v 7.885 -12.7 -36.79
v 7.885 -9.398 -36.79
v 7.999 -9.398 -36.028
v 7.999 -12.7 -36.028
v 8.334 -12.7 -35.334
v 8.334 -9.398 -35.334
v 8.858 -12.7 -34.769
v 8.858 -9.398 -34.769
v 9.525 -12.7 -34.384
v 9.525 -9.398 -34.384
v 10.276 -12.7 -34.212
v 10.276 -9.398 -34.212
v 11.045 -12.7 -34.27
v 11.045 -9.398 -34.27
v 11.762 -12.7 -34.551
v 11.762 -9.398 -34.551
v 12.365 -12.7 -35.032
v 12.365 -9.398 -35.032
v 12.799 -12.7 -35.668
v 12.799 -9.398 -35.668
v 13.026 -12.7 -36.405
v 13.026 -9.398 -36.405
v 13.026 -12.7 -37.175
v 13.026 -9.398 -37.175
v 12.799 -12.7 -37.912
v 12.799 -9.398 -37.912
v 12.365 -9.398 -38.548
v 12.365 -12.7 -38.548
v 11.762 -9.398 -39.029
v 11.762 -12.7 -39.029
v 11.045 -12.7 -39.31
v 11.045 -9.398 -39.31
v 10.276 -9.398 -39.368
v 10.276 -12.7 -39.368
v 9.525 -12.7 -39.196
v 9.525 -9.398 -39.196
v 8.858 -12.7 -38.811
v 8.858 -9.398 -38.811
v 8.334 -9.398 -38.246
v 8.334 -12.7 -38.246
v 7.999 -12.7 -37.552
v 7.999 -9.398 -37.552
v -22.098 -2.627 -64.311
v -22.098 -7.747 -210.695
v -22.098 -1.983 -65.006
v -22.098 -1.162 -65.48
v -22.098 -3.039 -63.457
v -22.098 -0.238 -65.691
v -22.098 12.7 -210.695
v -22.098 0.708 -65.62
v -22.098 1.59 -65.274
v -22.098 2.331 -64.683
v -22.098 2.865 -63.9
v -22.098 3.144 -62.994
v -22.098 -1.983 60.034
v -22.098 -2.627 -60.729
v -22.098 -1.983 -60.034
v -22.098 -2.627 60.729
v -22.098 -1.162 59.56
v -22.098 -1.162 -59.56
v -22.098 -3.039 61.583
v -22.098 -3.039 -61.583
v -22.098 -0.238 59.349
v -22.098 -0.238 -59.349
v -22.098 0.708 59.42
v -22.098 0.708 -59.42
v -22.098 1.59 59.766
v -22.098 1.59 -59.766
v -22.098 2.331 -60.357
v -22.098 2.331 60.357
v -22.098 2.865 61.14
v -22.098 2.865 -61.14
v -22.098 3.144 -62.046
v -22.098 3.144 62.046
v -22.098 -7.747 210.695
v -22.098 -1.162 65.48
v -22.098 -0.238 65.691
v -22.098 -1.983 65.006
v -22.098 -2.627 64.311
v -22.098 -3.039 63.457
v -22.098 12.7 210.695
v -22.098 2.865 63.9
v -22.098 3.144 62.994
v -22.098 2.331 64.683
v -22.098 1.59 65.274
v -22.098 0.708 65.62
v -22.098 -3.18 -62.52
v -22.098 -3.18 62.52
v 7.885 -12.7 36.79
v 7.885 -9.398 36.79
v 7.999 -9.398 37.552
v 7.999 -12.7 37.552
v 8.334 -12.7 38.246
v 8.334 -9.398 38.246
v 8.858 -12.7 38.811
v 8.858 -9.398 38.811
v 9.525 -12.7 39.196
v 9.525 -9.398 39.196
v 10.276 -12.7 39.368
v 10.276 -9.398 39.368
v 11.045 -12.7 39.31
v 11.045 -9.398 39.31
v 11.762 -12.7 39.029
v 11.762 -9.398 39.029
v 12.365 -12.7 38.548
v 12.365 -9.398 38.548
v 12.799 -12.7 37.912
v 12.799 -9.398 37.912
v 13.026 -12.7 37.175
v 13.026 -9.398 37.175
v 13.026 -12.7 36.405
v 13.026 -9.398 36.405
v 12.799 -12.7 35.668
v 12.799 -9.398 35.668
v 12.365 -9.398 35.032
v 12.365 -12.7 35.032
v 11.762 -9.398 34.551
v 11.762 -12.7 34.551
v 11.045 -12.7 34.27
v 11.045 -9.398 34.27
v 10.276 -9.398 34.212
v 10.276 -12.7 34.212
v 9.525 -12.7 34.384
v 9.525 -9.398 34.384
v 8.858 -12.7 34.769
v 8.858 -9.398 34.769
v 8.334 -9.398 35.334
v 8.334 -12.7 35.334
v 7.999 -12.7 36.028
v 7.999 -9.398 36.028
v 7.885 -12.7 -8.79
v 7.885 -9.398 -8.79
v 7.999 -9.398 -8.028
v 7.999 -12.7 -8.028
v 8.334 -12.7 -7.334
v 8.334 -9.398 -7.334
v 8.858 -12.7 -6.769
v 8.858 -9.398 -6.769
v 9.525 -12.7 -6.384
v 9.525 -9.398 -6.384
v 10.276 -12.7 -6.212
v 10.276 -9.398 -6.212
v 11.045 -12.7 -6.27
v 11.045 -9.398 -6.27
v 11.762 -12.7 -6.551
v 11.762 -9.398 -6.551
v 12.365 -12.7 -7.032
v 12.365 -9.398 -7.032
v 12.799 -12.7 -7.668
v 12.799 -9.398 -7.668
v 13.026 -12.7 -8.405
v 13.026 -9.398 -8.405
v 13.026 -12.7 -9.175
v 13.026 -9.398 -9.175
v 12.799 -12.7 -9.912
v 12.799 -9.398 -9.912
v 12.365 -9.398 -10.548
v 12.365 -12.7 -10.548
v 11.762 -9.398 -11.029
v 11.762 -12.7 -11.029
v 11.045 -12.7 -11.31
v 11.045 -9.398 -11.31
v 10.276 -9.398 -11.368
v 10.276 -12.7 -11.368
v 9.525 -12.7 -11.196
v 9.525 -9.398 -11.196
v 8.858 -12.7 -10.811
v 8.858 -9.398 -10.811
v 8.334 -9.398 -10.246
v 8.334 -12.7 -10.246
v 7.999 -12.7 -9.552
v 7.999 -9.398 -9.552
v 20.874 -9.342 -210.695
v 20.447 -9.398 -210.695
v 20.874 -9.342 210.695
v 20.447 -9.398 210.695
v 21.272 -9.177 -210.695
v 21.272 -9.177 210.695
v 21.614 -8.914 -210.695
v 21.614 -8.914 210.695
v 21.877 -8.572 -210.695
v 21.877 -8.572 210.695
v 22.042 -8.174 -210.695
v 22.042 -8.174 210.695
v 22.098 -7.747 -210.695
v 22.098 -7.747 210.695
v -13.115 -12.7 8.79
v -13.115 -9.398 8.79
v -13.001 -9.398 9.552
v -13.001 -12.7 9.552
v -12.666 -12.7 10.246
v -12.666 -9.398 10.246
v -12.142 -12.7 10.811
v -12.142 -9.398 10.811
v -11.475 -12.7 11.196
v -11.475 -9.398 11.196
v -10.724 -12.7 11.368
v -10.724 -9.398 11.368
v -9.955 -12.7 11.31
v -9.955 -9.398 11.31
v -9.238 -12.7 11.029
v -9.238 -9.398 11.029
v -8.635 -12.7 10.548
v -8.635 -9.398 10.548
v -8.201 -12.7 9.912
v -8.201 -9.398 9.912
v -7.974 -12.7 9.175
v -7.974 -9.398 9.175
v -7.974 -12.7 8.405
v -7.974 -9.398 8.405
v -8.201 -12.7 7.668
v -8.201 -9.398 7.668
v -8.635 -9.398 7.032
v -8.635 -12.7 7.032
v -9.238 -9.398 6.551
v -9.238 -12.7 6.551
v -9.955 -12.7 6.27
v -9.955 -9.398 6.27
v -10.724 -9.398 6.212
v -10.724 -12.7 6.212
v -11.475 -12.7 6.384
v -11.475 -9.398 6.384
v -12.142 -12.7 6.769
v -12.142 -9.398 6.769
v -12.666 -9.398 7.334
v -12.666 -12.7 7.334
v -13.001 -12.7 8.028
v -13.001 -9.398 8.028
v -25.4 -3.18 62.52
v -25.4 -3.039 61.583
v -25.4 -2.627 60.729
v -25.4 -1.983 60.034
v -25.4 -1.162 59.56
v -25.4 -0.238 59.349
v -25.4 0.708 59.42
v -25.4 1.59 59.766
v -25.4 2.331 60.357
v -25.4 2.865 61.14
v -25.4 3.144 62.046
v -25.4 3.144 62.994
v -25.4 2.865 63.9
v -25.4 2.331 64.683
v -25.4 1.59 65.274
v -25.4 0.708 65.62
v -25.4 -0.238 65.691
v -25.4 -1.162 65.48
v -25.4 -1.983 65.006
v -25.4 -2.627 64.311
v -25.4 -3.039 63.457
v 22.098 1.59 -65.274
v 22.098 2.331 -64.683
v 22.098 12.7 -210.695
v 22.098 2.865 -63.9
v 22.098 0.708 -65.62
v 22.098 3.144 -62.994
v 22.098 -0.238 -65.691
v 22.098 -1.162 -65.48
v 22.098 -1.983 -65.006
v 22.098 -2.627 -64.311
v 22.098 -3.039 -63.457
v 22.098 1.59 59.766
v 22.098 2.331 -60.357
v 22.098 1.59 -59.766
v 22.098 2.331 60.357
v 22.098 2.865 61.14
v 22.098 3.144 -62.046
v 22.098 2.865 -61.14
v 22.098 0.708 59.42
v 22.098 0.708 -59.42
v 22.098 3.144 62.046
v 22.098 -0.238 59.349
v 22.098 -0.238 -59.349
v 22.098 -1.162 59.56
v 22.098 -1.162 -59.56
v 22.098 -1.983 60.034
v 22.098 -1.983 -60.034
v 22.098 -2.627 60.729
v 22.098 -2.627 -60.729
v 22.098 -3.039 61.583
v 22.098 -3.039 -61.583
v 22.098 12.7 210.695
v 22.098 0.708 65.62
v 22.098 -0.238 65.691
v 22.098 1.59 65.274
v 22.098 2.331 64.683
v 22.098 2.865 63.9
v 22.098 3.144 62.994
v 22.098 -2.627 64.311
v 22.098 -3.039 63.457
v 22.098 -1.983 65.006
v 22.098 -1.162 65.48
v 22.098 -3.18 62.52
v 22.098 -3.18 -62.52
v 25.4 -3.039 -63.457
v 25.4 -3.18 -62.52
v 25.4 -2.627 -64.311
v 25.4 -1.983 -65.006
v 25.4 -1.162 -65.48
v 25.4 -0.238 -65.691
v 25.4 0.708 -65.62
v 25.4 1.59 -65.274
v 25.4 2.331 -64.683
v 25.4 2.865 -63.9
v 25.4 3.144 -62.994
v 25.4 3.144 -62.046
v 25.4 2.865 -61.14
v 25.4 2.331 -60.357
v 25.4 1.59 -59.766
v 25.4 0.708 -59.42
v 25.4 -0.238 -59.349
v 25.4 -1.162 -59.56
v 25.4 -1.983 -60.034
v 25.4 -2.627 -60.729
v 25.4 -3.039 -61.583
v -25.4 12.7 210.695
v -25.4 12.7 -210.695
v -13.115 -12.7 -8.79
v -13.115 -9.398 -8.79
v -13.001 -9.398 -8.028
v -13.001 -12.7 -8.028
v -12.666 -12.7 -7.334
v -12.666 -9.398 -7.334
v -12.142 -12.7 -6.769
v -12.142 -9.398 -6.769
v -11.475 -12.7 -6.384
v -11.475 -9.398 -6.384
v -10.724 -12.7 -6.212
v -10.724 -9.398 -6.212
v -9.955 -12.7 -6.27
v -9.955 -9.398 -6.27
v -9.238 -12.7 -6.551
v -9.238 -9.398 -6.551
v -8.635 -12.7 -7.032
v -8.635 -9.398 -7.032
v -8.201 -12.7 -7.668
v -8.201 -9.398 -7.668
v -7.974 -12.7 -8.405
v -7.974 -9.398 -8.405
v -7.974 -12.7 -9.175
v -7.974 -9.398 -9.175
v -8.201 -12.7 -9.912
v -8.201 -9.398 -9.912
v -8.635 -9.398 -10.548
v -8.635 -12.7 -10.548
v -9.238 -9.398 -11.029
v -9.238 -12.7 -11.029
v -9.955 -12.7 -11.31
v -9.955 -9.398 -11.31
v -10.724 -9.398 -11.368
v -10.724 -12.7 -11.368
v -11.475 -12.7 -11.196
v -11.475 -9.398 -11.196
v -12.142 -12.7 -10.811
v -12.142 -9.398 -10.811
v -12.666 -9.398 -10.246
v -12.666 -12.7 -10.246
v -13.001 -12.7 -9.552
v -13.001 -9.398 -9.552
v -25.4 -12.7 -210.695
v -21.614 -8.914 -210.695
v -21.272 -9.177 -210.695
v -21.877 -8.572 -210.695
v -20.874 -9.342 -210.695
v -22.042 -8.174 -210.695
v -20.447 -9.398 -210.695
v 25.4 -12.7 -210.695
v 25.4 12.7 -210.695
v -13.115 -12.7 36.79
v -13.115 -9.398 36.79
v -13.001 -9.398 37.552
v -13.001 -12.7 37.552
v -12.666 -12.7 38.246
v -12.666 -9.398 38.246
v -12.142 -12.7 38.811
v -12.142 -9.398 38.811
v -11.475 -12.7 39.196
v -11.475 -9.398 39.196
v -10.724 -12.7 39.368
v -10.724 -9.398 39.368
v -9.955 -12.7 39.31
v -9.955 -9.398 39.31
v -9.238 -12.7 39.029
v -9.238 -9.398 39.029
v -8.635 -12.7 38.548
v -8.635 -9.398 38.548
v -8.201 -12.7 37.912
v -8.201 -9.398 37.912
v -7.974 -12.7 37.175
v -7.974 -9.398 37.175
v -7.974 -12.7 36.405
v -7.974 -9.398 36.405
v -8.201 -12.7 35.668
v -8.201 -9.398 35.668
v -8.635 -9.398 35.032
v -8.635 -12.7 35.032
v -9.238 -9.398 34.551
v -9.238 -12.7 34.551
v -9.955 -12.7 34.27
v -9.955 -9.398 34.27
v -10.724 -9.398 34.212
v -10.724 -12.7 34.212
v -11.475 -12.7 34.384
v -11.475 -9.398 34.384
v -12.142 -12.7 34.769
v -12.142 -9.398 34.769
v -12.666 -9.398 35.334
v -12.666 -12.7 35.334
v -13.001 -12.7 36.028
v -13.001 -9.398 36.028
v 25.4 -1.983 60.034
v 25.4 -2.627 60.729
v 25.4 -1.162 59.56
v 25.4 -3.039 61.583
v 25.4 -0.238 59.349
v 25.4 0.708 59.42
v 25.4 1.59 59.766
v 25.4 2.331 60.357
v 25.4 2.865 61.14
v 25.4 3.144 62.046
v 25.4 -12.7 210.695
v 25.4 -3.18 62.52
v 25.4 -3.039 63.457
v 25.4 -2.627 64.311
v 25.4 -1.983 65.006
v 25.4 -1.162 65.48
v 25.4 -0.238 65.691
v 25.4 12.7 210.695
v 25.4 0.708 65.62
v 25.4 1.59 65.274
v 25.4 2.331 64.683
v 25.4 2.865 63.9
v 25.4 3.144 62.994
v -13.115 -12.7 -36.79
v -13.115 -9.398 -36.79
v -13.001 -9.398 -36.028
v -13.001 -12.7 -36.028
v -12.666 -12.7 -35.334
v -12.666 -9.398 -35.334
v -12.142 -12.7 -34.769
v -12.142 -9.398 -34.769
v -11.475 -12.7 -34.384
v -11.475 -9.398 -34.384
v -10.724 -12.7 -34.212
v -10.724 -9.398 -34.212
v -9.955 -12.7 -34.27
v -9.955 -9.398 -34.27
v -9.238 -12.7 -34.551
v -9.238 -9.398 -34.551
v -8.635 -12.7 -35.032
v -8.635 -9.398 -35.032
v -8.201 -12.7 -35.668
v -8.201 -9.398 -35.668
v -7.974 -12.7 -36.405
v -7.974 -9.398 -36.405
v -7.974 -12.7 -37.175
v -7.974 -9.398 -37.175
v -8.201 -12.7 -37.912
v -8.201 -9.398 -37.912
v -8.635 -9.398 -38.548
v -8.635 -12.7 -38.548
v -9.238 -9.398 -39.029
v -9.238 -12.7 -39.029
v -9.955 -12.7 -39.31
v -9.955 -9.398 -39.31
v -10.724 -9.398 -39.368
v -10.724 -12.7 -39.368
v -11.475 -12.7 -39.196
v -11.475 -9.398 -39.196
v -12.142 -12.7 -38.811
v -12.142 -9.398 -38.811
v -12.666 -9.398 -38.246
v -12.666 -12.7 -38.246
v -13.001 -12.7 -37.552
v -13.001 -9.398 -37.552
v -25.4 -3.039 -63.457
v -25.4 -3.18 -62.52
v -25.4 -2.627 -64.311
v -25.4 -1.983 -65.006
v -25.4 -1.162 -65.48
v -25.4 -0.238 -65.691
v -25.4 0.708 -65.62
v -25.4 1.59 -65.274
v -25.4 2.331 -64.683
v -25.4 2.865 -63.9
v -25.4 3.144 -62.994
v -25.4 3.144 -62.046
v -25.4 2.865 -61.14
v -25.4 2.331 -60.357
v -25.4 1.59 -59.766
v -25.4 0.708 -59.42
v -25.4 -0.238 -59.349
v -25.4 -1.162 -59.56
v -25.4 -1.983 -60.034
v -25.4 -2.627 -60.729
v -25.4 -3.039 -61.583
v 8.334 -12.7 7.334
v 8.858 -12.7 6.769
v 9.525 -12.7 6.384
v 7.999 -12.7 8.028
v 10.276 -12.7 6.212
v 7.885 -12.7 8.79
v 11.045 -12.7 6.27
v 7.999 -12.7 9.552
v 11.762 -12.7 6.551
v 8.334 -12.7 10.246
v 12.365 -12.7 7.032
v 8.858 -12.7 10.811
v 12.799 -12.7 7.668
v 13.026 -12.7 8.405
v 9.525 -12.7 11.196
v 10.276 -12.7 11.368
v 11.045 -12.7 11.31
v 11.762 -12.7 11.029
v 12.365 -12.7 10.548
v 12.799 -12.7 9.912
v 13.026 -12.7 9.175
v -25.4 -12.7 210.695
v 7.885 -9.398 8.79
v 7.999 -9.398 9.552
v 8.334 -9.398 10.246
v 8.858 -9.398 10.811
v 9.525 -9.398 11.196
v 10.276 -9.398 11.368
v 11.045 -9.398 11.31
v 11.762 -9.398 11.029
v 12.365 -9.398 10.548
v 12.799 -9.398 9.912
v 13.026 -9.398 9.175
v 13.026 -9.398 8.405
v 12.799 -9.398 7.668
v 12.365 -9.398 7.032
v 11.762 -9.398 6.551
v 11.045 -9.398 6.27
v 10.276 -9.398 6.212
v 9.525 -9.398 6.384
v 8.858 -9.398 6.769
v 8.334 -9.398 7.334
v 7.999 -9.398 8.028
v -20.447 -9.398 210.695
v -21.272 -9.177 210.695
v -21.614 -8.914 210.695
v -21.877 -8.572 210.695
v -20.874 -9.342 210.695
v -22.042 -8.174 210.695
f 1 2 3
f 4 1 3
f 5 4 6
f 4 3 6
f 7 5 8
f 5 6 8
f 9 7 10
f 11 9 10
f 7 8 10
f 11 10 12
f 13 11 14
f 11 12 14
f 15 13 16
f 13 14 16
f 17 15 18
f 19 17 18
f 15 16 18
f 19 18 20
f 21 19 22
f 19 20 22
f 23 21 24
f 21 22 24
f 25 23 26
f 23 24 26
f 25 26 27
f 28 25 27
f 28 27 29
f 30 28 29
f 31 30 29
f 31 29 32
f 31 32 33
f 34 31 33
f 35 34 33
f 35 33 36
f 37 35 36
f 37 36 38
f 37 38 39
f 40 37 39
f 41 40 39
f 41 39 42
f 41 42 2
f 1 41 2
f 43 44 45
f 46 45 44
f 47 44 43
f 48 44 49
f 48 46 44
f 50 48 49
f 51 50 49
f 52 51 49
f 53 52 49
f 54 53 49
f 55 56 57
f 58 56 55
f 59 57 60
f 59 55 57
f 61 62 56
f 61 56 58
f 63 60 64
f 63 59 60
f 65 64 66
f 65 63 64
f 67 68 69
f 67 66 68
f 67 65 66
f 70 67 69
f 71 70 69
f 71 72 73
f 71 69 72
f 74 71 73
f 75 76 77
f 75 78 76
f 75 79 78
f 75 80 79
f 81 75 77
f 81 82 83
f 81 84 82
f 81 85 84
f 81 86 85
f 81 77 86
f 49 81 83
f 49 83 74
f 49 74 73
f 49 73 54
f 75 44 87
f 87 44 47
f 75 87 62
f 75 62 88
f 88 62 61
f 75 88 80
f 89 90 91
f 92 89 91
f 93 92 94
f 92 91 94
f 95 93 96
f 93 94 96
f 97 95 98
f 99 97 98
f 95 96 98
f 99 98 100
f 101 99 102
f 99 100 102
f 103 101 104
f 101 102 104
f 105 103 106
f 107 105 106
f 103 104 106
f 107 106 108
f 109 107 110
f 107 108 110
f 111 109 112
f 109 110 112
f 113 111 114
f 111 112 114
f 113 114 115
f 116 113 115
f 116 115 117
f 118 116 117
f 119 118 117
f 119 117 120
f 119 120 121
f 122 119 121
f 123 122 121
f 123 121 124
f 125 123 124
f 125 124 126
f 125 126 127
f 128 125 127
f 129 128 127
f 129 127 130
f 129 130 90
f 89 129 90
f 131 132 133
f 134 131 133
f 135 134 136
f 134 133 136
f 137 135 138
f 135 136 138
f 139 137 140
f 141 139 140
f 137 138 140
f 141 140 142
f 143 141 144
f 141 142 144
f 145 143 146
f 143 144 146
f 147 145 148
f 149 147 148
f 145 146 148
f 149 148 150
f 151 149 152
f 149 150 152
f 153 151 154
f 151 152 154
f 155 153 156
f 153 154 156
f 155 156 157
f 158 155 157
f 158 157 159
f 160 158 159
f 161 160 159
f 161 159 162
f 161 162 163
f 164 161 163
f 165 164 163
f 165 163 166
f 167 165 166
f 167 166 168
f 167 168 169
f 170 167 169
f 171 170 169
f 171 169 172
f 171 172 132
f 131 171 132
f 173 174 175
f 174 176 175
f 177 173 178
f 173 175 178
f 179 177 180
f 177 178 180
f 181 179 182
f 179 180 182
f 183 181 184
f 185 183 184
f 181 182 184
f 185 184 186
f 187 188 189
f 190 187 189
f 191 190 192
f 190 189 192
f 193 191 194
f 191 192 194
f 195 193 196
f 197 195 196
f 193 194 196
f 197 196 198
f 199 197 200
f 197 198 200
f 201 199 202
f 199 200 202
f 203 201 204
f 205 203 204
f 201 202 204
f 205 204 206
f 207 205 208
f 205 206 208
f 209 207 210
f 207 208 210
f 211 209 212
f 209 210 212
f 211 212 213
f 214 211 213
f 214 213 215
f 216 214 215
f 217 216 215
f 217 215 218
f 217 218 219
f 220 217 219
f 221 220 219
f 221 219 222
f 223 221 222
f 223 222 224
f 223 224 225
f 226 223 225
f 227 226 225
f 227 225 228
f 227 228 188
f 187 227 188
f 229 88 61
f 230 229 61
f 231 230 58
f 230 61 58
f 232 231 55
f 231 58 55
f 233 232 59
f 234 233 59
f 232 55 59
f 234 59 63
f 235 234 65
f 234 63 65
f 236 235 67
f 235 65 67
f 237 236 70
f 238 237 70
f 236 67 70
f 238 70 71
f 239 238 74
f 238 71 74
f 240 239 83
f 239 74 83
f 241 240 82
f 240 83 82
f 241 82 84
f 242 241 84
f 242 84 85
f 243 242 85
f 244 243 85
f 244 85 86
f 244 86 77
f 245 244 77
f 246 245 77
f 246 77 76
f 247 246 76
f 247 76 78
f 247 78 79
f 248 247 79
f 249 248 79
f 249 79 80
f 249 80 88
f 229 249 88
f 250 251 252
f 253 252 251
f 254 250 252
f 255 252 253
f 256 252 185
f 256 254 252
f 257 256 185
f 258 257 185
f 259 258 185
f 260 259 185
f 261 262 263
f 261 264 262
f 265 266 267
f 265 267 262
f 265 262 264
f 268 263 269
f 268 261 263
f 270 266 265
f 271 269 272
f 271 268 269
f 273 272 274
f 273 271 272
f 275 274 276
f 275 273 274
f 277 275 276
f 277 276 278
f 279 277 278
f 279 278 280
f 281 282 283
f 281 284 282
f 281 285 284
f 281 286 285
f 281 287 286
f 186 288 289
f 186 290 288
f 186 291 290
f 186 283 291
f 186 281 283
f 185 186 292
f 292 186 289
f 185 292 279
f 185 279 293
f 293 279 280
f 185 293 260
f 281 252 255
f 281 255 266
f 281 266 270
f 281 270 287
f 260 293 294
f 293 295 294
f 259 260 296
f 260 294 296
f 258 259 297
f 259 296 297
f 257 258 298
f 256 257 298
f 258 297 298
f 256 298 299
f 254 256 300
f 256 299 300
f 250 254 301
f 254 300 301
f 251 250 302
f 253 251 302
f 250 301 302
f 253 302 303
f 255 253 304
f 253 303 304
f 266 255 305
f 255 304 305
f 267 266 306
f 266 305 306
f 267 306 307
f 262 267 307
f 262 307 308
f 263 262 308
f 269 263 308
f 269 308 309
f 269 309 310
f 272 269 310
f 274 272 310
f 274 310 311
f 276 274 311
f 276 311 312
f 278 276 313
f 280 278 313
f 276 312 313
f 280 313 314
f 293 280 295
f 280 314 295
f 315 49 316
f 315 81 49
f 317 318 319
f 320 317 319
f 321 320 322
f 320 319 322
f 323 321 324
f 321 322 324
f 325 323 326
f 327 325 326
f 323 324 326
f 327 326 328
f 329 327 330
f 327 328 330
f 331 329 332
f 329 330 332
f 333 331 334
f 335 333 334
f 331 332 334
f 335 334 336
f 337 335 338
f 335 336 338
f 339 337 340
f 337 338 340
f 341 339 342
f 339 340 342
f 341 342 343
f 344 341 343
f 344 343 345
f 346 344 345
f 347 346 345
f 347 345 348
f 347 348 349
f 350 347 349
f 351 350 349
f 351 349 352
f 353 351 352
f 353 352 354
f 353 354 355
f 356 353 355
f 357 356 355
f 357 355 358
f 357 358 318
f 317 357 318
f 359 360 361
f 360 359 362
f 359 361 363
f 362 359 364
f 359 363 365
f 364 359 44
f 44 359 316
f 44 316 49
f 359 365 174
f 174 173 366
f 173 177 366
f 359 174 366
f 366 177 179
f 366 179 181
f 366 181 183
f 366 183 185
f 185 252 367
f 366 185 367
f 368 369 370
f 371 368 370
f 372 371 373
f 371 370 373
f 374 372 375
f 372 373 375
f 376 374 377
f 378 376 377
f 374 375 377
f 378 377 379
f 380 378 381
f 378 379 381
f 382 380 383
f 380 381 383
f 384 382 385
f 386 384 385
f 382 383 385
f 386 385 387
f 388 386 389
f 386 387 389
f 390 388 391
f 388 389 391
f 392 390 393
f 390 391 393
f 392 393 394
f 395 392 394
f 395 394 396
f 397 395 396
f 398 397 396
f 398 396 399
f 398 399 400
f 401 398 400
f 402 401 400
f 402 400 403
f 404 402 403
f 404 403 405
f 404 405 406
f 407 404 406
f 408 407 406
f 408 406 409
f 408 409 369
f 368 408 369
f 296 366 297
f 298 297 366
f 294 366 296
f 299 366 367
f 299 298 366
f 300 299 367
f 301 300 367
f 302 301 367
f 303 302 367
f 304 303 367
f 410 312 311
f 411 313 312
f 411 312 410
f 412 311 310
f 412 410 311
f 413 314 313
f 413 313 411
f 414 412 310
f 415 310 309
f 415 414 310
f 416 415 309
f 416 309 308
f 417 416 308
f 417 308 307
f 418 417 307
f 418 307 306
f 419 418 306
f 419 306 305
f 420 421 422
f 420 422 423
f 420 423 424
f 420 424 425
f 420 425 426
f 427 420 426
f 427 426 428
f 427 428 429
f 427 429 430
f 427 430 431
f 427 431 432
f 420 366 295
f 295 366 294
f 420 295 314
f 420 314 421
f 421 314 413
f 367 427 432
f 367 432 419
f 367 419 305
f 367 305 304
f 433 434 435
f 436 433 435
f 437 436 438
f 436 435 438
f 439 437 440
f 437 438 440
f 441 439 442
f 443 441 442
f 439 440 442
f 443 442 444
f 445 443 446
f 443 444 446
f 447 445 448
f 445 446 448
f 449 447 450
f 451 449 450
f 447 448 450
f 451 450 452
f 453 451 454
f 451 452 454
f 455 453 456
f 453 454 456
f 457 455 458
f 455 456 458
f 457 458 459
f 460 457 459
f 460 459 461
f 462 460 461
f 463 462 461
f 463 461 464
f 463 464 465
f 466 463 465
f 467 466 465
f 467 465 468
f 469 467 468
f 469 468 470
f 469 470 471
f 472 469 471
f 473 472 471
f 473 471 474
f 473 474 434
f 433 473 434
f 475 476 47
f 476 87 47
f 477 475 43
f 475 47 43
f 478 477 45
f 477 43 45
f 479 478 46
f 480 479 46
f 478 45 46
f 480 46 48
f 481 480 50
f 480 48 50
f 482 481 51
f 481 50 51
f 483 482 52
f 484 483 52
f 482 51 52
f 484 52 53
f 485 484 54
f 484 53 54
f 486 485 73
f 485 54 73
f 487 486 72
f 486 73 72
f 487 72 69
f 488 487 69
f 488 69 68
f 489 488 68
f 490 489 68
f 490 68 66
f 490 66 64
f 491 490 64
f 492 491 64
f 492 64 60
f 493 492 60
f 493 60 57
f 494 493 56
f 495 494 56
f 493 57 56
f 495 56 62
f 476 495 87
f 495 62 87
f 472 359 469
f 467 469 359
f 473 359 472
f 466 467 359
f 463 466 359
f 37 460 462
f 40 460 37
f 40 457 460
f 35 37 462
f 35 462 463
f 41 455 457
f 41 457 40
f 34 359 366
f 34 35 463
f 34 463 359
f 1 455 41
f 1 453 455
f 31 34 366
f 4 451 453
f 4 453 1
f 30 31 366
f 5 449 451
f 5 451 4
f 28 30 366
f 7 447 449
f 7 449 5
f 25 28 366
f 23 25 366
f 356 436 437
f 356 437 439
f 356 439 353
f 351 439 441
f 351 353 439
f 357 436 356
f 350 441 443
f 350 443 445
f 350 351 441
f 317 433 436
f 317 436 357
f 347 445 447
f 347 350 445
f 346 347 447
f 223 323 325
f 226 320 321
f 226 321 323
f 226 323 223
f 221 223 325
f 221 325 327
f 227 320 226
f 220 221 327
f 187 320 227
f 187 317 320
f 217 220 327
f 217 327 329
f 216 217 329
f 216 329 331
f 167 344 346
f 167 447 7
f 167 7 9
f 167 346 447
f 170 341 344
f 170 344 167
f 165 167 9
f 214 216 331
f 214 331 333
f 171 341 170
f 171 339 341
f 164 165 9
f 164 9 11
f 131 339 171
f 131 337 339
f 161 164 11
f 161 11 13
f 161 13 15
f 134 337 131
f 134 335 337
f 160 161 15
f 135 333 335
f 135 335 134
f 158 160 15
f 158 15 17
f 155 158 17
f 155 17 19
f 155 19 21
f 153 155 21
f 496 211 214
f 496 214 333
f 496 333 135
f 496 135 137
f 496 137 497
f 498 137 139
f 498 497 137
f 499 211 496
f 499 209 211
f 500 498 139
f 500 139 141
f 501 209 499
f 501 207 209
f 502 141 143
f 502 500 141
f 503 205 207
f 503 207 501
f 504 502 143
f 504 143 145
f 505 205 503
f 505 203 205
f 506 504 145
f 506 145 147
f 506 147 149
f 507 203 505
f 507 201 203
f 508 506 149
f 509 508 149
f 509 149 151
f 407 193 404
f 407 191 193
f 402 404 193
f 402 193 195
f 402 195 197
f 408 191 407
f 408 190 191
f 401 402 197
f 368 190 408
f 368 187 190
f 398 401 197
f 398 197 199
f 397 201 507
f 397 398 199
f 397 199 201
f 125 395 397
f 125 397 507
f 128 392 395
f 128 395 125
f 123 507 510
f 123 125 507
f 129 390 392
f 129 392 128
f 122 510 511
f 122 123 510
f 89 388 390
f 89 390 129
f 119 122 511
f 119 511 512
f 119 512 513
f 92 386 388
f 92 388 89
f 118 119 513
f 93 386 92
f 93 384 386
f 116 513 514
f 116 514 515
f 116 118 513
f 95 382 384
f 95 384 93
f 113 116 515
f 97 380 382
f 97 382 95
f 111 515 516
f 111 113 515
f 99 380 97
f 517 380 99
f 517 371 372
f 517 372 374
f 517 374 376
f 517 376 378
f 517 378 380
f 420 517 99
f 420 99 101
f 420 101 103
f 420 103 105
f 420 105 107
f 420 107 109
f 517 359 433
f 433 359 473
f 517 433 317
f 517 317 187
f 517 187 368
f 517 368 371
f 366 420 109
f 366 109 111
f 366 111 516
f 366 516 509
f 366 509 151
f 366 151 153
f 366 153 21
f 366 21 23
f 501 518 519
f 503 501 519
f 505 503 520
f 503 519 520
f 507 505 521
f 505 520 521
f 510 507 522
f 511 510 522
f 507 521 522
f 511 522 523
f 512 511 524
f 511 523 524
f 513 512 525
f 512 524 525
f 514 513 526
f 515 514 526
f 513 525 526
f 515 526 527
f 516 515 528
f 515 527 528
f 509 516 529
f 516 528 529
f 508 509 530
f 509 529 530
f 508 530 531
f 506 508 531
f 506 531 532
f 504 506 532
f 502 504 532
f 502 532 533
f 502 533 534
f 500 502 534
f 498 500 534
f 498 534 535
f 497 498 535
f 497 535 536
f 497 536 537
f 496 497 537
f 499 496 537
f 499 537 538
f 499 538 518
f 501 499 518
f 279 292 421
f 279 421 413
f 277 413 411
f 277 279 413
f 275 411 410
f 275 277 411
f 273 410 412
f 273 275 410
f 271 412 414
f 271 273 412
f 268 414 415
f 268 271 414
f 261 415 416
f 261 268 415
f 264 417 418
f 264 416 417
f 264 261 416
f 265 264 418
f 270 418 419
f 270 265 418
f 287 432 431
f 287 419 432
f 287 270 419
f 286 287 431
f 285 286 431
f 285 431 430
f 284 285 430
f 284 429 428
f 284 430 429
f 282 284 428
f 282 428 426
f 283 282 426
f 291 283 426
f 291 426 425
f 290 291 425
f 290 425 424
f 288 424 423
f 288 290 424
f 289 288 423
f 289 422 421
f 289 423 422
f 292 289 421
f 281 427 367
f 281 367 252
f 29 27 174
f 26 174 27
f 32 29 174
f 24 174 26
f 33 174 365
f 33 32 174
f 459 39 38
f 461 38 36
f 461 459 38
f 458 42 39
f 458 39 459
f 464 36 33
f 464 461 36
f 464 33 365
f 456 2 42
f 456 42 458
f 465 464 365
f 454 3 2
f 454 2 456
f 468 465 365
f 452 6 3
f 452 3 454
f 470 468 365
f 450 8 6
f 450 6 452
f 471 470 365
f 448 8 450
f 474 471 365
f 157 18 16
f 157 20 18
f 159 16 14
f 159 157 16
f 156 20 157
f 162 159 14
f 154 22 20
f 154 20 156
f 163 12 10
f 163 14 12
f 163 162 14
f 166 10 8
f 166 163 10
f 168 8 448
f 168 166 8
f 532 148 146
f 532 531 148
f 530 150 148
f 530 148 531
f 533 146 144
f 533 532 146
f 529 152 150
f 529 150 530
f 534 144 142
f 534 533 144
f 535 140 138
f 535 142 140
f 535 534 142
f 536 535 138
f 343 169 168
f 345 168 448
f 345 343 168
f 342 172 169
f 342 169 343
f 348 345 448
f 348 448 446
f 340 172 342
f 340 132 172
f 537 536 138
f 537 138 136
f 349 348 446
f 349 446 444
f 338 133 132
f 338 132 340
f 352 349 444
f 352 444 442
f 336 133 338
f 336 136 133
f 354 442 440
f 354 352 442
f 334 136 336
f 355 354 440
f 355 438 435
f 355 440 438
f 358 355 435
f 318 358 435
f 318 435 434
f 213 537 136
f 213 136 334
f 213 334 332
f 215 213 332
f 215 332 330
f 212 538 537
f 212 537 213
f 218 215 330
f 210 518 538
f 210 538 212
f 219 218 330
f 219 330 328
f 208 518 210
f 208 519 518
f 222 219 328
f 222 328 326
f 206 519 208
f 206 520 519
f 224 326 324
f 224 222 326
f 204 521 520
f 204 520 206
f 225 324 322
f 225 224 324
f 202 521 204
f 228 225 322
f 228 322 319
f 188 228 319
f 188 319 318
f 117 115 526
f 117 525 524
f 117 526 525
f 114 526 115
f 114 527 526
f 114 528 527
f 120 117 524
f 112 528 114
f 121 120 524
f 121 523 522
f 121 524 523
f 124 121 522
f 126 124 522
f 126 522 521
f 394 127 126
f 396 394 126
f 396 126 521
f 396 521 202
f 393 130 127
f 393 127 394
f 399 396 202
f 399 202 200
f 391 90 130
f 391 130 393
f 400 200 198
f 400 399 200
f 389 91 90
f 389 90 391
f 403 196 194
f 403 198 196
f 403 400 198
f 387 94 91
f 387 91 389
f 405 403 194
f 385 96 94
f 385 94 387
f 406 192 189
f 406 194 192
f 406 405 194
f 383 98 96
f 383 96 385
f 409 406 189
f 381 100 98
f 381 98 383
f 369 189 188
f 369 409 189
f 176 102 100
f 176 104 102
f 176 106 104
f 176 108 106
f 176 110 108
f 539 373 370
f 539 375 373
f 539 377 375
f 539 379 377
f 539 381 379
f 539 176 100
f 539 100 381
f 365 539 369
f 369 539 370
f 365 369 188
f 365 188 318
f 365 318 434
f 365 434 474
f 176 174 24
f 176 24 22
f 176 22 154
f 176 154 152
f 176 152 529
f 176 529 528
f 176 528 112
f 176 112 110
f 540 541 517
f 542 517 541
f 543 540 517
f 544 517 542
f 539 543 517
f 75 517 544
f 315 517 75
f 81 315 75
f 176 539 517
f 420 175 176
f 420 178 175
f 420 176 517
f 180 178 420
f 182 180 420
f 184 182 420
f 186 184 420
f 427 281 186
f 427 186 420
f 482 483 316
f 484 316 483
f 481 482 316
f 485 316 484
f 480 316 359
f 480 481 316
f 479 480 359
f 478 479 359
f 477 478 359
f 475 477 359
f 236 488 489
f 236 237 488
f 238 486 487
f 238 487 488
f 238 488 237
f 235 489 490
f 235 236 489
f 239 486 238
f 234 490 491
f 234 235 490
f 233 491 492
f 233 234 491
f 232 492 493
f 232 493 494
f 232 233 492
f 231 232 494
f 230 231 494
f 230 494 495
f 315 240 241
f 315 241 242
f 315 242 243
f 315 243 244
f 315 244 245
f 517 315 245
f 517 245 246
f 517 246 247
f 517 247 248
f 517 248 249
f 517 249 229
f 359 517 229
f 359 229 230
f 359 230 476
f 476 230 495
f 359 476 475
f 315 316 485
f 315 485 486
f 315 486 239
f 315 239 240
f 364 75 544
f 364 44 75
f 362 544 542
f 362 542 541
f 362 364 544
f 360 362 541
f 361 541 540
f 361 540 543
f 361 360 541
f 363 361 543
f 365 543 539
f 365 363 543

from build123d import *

# Parameters (mm, degrees)
BOSS_EXTRUDE1_DEPTH = 210.695
FILLET1_R           = 1.651
SKETCH4_R           = 2.585
CUT_EXTRUDE1_DEPTH  = 10
SKETCH9_R           = 3.18
CUT_EXTRUDE2_DEPTH  = 30


with BuildPart() as part:
    # Sketch3 → Boss-Extrude1 (new, symmetric)
    with BuildSketch(Plane.XY):
        Polygon((-25.4, 12.7), (-25.4, -12.7), (25.4, -12.7), (25.4, 12.7), (22.098, 12.7), (22.098, -9.398), (-22.098, -9.398), (-22.098, 12.7), align=None)
    extrude(amount=BOSS_EXTRUDE1_DEPTH, both=True)

    # Fillet1
    fillet1_edges = [part.edges().sort_by_distance(p)[0] for p in [
        (-22.098, -9.398, 0),
        (22.098, -9.398, 0),
    ]]
    fillet(fillet1_edges, radius=FILLET1_R)

    # Sketch4 → Cut-Extrude1 (cut)
    with BuildSketch(Plane(origin=(0, -9.398, 0), x_dir=(1, 0, 0), z_dir=(0, 1, 0))):
        with Locations(Location((-10.530435142, 8.79, 0), (0, 0, 180))):
            Circle(SKETCH4_R)
        with Locations(Location((10.469564858, 8.79, 0), (0, 0, 180))):
            Circle(SKETCH4_R)
        with Locations(Location((-10.530435142, 36.79, 0), (0, 0, 180))):
            Circle(SKETCH4_R)
        with Locations(Location((10.469564858, 36.79, 0), (0, 0, 180))):
            Circle(SKETCH4_R)
        with Locations(Location((-10.530435142, -36.79, 0), (0, 0, 180))):
            Circle(SKETCH4_R)
        with Locations(Location((10.469564858, -36.79, 0), (0, 0, 180))):
            Circle(SKETCH4_R)
        with Locations(Location((10.469564858, -8.79, 0), (0, 0, 180))):
            Circle(SKETCH4_R)
        with Locations(Location((-10.530435142, -8.79, 0), (0, 0, 180))):
            Circle(SKETCH4_R)
    extrude(amount=-CUT_EXTRUDE1_DEPTH, mode=Mode.SUBTRACT)

    # Sketch9 → Cut-Extrude2 (cut, symmetric)
    with BuildSketch(Plane(origin=(0, 0, 0), x_dir=(0, 0, -1), z_dir=(1, 0, 0))):
        with Locations(Location((-62.52, 0, 0), (0, 0, 270))):
            Circle(SKETCH9_R)
        with Locations(Location((62.52, 0, 0), (0, 0, 270))):
            Circle(SKETCH9_R)
    extrude(amount=CUT_EXTRUDE2_DEPTH, both=True, mode=Mode.SUBTRACT)


solid = part.part
